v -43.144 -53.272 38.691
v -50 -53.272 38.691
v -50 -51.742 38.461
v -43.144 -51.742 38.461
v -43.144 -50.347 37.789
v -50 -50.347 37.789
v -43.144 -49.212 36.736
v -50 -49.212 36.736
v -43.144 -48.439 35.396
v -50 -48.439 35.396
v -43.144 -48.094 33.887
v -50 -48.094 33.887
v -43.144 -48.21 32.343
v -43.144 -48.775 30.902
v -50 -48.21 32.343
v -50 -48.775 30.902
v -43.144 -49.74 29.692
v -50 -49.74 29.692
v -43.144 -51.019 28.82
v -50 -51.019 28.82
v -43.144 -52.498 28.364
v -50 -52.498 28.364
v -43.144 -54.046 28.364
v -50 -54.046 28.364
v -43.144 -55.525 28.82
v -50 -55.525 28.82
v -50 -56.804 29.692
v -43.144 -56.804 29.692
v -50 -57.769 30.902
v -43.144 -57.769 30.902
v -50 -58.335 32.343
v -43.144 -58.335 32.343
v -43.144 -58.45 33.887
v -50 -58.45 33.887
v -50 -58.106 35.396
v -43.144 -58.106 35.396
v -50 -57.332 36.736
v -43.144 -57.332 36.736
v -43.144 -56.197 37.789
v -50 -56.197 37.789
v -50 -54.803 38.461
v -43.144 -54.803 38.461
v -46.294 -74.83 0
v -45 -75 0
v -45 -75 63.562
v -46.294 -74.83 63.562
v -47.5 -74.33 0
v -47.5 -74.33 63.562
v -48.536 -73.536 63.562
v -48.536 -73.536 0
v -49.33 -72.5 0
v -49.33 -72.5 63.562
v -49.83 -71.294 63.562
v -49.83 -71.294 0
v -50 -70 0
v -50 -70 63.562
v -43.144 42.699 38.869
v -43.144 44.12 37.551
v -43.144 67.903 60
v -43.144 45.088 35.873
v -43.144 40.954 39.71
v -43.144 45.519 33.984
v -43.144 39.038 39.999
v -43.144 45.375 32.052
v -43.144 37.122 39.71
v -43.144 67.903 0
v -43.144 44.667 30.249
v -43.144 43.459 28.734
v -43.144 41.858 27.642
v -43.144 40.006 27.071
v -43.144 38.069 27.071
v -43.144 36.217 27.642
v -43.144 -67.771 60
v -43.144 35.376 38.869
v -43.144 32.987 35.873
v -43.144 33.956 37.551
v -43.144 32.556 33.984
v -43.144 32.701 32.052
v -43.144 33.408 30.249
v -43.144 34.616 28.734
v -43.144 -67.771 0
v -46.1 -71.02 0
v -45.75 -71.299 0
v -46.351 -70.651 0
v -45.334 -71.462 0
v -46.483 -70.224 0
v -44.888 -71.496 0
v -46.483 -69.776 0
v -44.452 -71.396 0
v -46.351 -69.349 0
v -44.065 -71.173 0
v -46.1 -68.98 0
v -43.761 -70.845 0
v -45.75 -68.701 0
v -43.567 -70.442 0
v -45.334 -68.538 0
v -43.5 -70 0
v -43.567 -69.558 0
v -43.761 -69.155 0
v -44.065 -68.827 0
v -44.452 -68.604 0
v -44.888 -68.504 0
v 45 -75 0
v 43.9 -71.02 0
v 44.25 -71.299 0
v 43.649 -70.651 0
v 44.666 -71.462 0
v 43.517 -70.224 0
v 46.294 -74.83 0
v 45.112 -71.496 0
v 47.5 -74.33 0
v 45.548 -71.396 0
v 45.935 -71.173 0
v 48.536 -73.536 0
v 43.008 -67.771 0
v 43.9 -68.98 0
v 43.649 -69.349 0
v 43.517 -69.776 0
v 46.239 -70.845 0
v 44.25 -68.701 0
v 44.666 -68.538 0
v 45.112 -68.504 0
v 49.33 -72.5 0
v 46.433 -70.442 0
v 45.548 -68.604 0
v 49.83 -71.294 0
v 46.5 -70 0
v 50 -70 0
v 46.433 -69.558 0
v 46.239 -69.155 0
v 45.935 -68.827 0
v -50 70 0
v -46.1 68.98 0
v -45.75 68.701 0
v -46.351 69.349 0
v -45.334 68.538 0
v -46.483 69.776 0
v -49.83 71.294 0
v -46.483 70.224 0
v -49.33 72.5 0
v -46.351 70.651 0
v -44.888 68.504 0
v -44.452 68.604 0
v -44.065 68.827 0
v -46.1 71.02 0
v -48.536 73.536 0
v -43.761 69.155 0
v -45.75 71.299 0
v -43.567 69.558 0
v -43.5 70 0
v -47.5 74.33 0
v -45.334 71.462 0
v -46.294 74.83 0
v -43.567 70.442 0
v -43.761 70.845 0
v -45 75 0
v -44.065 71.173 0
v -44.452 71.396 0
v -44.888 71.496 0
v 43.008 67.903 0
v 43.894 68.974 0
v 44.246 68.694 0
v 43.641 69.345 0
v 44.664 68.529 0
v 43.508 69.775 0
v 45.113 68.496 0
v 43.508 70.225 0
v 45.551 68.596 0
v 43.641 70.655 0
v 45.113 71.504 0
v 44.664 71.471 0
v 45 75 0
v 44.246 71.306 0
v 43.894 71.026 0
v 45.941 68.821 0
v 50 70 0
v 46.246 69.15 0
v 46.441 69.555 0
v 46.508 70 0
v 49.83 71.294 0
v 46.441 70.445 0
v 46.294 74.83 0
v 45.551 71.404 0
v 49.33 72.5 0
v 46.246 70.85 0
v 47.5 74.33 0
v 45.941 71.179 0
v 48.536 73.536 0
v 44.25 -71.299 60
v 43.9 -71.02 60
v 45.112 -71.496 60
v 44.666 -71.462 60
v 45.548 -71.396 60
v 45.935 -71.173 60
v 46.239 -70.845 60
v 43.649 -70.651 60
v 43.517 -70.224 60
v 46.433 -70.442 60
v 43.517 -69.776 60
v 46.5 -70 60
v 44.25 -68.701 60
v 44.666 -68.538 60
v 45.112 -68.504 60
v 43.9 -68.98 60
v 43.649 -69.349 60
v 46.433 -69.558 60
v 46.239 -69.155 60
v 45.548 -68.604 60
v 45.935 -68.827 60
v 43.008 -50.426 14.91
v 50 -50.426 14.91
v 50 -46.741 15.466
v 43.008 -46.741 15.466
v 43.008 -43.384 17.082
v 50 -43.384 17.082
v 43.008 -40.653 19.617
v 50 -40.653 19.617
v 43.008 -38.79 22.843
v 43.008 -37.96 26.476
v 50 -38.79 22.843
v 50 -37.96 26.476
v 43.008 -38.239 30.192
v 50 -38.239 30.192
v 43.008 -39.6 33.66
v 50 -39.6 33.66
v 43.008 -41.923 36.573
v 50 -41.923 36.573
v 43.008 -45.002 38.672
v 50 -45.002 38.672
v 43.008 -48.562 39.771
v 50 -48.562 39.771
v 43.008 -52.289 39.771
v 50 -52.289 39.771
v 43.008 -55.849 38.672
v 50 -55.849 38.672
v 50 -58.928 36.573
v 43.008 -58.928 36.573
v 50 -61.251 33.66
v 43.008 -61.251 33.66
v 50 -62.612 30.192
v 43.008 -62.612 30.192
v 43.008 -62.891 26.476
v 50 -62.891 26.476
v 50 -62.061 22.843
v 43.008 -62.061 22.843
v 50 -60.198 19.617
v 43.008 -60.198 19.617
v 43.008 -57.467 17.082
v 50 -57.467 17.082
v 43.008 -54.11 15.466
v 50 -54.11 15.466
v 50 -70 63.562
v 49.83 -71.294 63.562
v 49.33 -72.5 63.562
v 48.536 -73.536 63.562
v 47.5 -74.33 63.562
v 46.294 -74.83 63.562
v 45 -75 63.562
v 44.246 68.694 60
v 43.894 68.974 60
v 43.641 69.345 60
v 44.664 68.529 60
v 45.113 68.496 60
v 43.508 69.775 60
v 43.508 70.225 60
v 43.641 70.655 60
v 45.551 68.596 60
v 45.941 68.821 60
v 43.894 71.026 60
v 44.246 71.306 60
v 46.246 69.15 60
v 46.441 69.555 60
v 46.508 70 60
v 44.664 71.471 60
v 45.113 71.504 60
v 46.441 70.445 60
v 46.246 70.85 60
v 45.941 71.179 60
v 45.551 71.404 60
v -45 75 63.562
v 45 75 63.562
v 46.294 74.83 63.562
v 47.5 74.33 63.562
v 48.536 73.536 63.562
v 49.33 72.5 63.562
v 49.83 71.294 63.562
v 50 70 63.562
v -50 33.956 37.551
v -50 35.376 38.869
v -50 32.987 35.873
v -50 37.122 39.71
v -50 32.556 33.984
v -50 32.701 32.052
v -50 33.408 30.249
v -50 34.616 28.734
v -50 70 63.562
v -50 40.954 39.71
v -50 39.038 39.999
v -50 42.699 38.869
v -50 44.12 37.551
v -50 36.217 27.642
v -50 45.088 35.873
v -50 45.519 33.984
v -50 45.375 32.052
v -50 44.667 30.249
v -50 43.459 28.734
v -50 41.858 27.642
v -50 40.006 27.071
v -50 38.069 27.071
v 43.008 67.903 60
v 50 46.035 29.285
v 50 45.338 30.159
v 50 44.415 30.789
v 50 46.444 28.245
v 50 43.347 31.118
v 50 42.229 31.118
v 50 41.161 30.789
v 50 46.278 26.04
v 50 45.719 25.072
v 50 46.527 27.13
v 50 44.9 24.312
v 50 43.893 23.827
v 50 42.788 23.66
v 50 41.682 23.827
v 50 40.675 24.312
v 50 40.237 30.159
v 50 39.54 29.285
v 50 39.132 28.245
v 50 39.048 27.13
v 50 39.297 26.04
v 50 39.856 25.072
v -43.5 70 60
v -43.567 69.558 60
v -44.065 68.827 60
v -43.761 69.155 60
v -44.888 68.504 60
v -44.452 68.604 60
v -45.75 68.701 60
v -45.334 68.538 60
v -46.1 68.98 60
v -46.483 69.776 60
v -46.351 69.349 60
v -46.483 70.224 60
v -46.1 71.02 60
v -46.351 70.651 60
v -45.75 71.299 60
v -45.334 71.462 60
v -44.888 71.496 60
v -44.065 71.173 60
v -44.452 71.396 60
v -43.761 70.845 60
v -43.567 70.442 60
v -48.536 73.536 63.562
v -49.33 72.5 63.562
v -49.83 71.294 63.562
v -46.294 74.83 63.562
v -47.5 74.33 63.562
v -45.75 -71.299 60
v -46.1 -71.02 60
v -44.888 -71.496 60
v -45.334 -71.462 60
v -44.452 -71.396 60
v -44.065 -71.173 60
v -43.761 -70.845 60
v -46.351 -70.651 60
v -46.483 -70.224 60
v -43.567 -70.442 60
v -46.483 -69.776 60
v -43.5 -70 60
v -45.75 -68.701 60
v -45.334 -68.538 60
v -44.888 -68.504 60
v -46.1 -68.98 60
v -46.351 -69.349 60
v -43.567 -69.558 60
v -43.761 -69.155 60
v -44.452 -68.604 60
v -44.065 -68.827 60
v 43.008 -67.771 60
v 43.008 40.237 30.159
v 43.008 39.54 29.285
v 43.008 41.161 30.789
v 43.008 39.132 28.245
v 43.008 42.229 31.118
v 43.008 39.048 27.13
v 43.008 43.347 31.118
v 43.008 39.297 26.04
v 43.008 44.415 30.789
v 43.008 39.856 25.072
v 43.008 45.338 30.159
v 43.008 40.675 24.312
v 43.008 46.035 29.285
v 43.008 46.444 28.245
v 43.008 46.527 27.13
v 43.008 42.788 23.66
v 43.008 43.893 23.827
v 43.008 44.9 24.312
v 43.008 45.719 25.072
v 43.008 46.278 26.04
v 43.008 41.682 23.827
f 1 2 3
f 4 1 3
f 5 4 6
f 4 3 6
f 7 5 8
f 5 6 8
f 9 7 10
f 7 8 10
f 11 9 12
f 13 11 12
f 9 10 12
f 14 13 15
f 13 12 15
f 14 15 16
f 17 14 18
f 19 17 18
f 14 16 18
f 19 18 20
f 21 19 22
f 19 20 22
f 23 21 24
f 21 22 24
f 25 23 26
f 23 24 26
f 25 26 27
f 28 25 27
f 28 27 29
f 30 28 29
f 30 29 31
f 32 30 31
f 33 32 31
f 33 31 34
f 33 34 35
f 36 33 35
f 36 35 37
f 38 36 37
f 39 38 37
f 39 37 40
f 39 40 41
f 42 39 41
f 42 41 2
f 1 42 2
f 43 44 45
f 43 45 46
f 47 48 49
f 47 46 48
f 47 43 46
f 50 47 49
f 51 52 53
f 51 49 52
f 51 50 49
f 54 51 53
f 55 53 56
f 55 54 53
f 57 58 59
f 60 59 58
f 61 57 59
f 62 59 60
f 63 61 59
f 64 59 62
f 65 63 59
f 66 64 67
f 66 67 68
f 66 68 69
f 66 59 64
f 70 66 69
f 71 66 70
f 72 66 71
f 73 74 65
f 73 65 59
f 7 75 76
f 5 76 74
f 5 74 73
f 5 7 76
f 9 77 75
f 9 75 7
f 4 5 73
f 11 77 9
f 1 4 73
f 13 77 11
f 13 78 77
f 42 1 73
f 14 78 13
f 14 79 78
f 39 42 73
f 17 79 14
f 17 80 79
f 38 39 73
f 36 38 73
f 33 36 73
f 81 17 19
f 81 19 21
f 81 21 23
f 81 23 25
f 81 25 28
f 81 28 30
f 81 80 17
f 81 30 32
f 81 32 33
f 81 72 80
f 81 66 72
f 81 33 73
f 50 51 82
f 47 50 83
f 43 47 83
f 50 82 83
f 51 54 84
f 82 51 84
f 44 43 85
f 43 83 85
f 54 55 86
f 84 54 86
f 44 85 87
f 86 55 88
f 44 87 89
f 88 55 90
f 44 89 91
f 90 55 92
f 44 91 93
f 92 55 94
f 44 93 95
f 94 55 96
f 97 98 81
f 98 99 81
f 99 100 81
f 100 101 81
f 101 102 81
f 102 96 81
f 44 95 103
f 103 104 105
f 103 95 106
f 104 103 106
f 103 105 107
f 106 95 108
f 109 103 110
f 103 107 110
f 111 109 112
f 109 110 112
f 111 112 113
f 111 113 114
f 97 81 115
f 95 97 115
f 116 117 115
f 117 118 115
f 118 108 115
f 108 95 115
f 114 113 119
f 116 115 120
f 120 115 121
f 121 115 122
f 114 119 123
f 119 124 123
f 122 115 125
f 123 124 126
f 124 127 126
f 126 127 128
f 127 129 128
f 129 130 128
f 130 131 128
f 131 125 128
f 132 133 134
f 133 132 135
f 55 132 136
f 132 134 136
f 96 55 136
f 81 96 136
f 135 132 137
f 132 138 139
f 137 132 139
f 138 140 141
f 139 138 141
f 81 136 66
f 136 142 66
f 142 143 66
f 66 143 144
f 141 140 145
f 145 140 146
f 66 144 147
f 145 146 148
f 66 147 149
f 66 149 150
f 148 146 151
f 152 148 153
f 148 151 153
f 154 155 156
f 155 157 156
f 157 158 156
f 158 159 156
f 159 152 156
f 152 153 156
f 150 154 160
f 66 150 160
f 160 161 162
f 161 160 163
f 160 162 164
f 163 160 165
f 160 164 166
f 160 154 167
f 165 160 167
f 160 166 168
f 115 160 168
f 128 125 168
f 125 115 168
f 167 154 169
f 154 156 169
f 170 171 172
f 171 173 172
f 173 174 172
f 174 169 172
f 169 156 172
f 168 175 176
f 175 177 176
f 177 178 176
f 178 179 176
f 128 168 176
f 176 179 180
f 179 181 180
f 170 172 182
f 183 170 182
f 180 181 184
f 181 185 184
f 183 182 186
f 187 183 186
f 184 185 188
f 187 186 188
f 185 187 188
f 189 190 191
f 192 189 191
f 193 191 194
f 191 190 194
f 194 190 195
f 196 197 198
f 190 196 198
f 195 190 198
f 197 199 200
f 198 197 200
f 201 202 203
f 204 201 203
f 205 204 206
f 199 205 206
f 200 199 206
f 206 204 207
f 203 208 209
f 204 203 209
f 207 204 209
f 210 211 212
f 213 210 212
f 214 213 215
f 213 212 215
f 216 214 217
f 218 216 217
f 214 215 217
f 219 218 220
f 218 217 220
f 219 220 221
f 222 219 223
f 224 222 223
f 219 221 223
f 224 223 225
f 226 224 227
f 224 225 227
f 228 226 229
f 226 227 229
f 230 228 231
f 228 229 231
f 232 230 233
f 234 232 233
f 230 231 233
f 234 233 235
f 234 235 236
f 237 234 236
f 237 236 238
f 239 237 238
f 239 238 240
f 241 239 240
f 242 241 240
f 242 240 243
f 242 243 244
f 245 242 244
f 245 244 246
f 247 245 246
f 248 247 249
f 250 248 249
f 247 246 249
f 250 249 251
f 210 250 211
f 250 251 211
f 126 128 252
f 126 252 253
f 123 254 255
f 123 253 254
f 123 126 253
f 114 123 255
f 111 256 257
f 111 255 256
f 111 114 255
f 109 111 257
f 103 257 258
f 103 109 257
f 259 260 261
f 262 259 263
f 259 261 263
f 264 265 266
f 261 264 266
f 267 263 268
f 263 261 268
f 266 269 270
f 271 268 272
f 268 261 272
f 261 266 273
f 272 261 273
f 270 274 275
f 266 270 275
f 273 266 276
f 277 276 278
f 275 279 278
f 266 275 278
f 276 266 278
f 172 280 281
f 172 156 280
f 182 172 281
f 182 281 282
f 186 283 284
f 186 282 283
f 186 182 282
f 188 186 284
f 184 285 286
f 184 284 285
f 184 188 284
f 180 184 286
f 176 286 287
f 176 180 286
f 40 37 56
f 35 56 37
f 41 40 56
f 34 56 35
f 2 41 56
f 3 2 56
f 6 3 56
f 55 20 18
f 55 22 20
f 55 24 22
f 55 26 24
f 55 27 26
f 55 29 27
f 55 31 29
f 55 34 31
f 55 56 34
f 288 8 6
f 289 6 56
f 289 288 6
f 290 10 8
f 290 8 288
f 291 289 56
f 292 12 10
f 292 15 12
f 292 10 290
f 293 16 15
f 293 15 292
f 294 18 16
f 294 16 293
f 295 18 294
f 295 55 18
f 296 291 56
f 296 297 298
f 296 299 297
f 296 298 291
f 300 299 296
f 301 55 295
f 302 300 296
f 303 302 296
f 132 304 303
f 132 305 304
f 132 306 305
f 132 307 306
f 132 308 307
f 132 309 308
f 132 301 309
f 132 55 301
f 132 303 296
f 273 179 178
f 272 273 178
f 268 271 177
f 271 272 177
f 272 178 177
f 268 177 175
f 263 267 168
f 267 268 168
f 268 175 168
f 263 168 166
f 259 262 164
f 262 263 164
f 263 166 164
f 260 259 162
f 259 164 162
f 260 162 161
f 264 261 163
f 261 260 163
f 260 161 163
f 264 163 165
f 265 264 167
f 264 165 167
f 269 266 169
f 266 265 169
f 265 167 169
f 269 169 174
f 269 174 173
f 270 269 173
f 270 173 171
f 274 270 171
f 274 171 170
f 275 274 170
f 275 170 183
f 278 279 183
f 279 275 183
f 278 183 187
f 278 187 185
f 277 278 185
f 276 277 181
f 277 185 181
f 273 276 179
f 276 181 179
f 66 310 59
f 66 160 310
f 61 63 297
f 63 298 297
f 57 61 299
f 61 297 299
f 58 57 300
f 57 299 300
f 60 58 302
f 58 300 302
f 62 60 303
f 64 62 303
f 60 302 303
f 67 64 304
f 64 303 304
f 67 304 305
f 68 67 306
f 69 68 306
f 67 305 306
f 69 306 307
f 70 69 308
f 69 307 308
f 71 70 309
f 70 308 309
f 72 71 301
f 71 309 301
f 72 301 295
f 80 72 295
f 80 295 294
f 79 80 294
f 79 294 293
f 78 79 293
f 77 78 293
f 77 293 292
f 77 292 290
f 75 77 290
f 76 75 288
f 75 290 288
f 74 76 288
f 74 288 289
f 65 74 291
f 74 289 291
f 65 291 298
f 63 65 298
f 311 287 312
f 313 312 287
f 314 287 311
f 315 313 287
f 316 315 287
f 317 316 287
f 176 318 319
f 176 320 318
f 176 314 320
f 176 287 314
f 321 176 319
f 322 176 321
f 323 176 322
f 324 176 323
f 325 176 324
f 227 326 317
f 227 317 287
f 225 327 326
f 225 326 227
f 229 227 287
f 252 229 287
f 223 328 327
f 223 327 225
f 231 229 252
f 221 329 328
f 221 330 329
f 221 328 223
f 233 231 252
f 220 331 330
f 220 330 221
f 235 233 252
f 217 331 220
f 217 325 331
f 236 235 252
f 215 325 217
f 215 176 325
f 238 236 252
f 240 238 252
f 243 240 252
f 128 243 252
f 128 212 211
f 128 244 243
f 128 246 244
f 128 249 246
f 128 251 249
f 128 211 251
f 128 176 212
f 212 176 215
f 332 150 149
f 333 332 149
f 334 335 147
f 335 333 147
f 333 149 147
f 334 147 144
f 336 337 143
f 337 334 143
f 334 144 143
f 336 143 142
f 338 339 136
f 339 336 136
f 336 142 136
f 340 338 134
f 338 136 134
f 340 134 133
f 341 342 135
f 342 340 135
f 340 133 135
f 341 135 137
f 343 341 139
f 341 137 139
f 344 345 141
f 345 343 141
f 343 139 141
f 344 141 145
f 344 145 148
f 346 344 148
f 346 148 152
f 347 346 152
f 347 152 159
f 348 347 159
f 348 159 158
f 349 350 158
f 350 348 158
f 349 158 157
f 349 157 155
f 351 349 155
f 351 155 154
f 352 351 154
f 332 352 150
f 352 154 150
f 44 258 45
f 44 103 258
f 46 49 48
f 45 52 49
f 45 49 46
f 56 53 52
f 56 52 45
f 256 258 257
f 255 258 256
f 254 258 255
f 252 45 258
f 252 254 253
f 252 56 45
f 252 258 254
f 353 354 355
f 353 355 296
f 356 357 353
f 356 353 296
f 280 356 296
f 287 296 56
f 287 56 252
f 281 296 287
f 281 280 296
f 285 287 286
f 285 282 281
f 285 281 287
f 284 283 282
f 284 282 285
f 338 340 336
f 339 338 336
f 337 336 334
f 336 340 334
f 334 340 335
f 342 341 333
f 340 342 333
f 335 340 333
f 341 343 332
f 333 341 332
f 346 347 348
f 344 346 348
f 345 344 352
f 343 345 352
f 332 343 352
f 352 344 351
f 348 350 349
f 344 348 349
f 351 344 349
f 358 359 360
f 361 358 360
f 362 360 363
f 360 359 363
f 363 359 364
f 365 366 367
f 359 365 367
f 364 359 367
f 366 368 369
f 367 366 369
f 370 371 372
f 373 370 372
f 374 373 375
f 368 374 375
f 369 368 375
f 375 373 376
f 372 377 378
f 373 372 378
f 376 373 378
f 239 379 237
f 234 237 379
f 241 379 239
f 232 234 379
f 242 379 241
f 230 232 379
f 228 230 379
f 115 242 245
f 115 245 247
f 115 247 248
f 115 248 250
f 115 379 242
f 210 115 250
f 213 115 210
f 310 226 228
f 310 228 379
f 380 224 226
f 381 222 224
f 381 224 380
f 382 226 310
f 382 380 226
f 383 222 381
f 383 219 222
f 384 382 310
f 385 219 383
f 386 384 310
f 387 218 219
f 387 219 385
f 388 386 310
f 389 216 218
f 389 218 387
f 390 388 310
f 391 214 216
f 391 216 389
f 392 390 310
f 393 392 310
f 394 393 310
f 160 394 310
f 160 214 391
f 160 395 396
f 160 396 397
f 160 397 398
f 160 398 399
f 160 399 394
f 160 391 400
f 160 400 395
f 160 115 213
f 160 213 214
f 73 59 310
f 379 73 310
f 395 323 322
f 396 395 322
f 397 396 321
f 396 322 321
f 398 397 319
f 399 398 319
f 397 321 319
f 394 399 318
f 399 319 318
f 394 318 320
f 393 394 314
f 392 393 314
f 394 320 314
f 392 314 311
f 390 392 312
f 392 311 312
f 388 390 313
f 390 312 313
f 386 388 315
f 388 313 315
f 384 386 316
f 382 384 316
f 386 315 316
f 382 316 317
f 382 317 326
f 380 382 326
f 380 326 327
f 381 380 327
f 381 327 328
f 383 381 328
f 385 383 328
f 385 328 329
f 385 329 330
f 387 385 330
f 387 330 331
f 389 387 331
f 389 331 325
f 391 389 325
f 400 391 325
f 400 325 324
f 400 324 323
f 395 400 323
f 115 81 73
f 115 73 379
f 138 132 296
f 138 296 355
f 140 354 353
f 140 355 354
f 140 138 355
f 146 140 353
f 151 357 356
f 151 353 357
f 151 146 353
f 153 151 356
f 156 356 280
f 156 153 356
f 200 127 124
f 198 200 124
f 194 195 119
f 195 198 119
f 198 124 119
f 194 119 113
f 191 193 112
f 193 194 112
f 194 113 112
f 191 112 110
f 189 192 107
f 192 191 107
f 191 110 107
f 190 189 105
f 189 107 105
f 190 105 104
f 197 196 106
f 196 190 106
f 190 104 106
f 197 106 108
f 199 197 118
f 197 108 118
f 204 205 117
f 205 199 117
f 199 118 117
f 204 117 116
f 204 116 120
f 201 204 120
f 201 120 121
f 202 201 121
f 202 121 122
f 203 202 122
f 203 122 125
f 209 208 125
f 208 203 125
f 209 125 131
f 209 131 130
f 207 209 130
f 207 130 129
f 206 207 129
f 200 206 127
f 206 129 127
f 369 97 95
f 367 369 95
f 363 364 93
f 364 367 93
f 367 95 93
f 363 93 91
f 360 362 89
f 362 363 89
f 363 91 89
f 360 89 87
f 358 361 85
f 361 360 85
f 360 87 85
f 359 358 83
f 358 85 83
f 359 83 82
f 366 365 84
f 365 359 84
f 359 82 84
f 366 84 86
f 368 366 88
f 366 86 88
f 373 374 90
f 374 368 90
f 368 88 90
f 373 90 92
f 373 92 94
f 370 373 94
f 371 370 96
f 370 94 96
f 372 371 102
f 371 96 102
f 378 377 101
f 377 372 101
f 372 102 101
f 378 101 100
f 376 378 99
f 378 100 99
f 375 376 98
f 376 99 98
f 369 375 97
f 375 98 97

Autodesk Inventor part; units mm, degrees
ref_plane "YZ Plane" through (0, 0, 0) normal (1, 0, 0) x (0, 1, 0)
ref_plane "XZ Plane" through (0, 0, 0) normal (0, 1, 0) x (-1, 0, 0)
ref_plane "XY Plane" through (0, 0, 0) normal (0, 0, 1) x (1, 0, 0)
ref_plane "Work Plane1" through (0, 0, 0) normal (0, 0, 1) x (1, 0, 0)
sketch "Sketch1" plane through (0, 0, 0) normal (0, 0, 1) x (1, 0, 0)
  line L0 (45, 75) -> (-45, 75)
  line L1 (-50, 70) -> (-50, -70)
  line L2 (-45, -75) -> (45, -75)
  line L3 (50, -70) -> (50, 70)
  arc A0 (50, 70) -> (45, 75) centre (45, 70) ccw
  arc A1 (-45, 75) -> (-50, 70) centre (-45, 70) ccw
  arc A2 (-50, -70) -> (-45, -75) centre (-45, -70) ccw
  arc A3 (45, -75) -> (50, -70) centre (45, -70) ccw
  line L4 (43.008, 67.9028) -> (-43.1443, 67.9028)
  line L5 (-43.1443, 67.9028) -> (-43.1443, -67.7709)
  line L6 (-43.1443, -67.7709) -> (43.008, -67.7709)
  line L7 (43.008, -67.7709) -> (43.008, 67.9028)
  circle A4 centre (45, 70) radius 1.5085
  circle A5 centre (-45, 70) radius 1.5
  circle A6 centre (-45, -70) radius 1.5
  circle A7 centre (45, -70) radius 1.5
  point P0 (0, 0)
  dimension "d0" = 5
  dimension "d1" = 3
  dimension "d2" = 3
  dimension "d3" = 3
extrude "Extrusion1" add sketch "Sketch1" along normal blind 60
sketch "Sketch2" plane through (50, -70, 0) normal (1, 0, 0) x (0, 0, -1)
  circle A0 centre (-27.4102, 19.5745) radius 12.5
  circle A1 centre (-27.4102, 112.7876) radius 3.75
  point P0 (0, 70)
  dimension "d6" = 25
  dimension "d9" = 7.5
extrude "Extrusion2" cut sketch "Sketch2" against normal up to surface (6.992 mm away)
sketch "Sketch3" plane through (0, 0, 60) normal (0, 0, 1) x (1, 0, 0)
  line L0 (-45, 75) -> (45, 75)
  line L1 (50, 70) -> (50, -70)
  line L2 (45, -75) -> (-45, -75)
  line L3 (-50, -70) -> (-50, 70)
  arc A0 (45, -75) -> (50, -70) centre (45, -70) ccw
  arc A1 (-50, -70) -> (-45, -75) centre (-45, -70) ccw
  arc A2 (-45, 75) -> (-50, 70) centre (-45, 70) ccw
  arc A3 (50, 70) -> (45, 75) centre (45, 70) ccw
  point P0 (0, 0)
  dimension "d10" = 5
extrude "Extrusion3" add sketch "Sketch3" along normal blind 3.5625
sketch "Sketch4" plane through (-50, -70, 0) normal (-1, 0, 0) x (0, 0, 1)
  circle A0 centre (33.4987, 16.7277) radius 5.1927
  circle A1 centre (33.4987, 109.0376) radius 6.5
  point P0 (0, 70)
  dimension "d15" = 13
extrude "Extrusion4" cut sketch "Sketch4" against normal up to surface (6.8557 mm away)
properties part number "Base"
